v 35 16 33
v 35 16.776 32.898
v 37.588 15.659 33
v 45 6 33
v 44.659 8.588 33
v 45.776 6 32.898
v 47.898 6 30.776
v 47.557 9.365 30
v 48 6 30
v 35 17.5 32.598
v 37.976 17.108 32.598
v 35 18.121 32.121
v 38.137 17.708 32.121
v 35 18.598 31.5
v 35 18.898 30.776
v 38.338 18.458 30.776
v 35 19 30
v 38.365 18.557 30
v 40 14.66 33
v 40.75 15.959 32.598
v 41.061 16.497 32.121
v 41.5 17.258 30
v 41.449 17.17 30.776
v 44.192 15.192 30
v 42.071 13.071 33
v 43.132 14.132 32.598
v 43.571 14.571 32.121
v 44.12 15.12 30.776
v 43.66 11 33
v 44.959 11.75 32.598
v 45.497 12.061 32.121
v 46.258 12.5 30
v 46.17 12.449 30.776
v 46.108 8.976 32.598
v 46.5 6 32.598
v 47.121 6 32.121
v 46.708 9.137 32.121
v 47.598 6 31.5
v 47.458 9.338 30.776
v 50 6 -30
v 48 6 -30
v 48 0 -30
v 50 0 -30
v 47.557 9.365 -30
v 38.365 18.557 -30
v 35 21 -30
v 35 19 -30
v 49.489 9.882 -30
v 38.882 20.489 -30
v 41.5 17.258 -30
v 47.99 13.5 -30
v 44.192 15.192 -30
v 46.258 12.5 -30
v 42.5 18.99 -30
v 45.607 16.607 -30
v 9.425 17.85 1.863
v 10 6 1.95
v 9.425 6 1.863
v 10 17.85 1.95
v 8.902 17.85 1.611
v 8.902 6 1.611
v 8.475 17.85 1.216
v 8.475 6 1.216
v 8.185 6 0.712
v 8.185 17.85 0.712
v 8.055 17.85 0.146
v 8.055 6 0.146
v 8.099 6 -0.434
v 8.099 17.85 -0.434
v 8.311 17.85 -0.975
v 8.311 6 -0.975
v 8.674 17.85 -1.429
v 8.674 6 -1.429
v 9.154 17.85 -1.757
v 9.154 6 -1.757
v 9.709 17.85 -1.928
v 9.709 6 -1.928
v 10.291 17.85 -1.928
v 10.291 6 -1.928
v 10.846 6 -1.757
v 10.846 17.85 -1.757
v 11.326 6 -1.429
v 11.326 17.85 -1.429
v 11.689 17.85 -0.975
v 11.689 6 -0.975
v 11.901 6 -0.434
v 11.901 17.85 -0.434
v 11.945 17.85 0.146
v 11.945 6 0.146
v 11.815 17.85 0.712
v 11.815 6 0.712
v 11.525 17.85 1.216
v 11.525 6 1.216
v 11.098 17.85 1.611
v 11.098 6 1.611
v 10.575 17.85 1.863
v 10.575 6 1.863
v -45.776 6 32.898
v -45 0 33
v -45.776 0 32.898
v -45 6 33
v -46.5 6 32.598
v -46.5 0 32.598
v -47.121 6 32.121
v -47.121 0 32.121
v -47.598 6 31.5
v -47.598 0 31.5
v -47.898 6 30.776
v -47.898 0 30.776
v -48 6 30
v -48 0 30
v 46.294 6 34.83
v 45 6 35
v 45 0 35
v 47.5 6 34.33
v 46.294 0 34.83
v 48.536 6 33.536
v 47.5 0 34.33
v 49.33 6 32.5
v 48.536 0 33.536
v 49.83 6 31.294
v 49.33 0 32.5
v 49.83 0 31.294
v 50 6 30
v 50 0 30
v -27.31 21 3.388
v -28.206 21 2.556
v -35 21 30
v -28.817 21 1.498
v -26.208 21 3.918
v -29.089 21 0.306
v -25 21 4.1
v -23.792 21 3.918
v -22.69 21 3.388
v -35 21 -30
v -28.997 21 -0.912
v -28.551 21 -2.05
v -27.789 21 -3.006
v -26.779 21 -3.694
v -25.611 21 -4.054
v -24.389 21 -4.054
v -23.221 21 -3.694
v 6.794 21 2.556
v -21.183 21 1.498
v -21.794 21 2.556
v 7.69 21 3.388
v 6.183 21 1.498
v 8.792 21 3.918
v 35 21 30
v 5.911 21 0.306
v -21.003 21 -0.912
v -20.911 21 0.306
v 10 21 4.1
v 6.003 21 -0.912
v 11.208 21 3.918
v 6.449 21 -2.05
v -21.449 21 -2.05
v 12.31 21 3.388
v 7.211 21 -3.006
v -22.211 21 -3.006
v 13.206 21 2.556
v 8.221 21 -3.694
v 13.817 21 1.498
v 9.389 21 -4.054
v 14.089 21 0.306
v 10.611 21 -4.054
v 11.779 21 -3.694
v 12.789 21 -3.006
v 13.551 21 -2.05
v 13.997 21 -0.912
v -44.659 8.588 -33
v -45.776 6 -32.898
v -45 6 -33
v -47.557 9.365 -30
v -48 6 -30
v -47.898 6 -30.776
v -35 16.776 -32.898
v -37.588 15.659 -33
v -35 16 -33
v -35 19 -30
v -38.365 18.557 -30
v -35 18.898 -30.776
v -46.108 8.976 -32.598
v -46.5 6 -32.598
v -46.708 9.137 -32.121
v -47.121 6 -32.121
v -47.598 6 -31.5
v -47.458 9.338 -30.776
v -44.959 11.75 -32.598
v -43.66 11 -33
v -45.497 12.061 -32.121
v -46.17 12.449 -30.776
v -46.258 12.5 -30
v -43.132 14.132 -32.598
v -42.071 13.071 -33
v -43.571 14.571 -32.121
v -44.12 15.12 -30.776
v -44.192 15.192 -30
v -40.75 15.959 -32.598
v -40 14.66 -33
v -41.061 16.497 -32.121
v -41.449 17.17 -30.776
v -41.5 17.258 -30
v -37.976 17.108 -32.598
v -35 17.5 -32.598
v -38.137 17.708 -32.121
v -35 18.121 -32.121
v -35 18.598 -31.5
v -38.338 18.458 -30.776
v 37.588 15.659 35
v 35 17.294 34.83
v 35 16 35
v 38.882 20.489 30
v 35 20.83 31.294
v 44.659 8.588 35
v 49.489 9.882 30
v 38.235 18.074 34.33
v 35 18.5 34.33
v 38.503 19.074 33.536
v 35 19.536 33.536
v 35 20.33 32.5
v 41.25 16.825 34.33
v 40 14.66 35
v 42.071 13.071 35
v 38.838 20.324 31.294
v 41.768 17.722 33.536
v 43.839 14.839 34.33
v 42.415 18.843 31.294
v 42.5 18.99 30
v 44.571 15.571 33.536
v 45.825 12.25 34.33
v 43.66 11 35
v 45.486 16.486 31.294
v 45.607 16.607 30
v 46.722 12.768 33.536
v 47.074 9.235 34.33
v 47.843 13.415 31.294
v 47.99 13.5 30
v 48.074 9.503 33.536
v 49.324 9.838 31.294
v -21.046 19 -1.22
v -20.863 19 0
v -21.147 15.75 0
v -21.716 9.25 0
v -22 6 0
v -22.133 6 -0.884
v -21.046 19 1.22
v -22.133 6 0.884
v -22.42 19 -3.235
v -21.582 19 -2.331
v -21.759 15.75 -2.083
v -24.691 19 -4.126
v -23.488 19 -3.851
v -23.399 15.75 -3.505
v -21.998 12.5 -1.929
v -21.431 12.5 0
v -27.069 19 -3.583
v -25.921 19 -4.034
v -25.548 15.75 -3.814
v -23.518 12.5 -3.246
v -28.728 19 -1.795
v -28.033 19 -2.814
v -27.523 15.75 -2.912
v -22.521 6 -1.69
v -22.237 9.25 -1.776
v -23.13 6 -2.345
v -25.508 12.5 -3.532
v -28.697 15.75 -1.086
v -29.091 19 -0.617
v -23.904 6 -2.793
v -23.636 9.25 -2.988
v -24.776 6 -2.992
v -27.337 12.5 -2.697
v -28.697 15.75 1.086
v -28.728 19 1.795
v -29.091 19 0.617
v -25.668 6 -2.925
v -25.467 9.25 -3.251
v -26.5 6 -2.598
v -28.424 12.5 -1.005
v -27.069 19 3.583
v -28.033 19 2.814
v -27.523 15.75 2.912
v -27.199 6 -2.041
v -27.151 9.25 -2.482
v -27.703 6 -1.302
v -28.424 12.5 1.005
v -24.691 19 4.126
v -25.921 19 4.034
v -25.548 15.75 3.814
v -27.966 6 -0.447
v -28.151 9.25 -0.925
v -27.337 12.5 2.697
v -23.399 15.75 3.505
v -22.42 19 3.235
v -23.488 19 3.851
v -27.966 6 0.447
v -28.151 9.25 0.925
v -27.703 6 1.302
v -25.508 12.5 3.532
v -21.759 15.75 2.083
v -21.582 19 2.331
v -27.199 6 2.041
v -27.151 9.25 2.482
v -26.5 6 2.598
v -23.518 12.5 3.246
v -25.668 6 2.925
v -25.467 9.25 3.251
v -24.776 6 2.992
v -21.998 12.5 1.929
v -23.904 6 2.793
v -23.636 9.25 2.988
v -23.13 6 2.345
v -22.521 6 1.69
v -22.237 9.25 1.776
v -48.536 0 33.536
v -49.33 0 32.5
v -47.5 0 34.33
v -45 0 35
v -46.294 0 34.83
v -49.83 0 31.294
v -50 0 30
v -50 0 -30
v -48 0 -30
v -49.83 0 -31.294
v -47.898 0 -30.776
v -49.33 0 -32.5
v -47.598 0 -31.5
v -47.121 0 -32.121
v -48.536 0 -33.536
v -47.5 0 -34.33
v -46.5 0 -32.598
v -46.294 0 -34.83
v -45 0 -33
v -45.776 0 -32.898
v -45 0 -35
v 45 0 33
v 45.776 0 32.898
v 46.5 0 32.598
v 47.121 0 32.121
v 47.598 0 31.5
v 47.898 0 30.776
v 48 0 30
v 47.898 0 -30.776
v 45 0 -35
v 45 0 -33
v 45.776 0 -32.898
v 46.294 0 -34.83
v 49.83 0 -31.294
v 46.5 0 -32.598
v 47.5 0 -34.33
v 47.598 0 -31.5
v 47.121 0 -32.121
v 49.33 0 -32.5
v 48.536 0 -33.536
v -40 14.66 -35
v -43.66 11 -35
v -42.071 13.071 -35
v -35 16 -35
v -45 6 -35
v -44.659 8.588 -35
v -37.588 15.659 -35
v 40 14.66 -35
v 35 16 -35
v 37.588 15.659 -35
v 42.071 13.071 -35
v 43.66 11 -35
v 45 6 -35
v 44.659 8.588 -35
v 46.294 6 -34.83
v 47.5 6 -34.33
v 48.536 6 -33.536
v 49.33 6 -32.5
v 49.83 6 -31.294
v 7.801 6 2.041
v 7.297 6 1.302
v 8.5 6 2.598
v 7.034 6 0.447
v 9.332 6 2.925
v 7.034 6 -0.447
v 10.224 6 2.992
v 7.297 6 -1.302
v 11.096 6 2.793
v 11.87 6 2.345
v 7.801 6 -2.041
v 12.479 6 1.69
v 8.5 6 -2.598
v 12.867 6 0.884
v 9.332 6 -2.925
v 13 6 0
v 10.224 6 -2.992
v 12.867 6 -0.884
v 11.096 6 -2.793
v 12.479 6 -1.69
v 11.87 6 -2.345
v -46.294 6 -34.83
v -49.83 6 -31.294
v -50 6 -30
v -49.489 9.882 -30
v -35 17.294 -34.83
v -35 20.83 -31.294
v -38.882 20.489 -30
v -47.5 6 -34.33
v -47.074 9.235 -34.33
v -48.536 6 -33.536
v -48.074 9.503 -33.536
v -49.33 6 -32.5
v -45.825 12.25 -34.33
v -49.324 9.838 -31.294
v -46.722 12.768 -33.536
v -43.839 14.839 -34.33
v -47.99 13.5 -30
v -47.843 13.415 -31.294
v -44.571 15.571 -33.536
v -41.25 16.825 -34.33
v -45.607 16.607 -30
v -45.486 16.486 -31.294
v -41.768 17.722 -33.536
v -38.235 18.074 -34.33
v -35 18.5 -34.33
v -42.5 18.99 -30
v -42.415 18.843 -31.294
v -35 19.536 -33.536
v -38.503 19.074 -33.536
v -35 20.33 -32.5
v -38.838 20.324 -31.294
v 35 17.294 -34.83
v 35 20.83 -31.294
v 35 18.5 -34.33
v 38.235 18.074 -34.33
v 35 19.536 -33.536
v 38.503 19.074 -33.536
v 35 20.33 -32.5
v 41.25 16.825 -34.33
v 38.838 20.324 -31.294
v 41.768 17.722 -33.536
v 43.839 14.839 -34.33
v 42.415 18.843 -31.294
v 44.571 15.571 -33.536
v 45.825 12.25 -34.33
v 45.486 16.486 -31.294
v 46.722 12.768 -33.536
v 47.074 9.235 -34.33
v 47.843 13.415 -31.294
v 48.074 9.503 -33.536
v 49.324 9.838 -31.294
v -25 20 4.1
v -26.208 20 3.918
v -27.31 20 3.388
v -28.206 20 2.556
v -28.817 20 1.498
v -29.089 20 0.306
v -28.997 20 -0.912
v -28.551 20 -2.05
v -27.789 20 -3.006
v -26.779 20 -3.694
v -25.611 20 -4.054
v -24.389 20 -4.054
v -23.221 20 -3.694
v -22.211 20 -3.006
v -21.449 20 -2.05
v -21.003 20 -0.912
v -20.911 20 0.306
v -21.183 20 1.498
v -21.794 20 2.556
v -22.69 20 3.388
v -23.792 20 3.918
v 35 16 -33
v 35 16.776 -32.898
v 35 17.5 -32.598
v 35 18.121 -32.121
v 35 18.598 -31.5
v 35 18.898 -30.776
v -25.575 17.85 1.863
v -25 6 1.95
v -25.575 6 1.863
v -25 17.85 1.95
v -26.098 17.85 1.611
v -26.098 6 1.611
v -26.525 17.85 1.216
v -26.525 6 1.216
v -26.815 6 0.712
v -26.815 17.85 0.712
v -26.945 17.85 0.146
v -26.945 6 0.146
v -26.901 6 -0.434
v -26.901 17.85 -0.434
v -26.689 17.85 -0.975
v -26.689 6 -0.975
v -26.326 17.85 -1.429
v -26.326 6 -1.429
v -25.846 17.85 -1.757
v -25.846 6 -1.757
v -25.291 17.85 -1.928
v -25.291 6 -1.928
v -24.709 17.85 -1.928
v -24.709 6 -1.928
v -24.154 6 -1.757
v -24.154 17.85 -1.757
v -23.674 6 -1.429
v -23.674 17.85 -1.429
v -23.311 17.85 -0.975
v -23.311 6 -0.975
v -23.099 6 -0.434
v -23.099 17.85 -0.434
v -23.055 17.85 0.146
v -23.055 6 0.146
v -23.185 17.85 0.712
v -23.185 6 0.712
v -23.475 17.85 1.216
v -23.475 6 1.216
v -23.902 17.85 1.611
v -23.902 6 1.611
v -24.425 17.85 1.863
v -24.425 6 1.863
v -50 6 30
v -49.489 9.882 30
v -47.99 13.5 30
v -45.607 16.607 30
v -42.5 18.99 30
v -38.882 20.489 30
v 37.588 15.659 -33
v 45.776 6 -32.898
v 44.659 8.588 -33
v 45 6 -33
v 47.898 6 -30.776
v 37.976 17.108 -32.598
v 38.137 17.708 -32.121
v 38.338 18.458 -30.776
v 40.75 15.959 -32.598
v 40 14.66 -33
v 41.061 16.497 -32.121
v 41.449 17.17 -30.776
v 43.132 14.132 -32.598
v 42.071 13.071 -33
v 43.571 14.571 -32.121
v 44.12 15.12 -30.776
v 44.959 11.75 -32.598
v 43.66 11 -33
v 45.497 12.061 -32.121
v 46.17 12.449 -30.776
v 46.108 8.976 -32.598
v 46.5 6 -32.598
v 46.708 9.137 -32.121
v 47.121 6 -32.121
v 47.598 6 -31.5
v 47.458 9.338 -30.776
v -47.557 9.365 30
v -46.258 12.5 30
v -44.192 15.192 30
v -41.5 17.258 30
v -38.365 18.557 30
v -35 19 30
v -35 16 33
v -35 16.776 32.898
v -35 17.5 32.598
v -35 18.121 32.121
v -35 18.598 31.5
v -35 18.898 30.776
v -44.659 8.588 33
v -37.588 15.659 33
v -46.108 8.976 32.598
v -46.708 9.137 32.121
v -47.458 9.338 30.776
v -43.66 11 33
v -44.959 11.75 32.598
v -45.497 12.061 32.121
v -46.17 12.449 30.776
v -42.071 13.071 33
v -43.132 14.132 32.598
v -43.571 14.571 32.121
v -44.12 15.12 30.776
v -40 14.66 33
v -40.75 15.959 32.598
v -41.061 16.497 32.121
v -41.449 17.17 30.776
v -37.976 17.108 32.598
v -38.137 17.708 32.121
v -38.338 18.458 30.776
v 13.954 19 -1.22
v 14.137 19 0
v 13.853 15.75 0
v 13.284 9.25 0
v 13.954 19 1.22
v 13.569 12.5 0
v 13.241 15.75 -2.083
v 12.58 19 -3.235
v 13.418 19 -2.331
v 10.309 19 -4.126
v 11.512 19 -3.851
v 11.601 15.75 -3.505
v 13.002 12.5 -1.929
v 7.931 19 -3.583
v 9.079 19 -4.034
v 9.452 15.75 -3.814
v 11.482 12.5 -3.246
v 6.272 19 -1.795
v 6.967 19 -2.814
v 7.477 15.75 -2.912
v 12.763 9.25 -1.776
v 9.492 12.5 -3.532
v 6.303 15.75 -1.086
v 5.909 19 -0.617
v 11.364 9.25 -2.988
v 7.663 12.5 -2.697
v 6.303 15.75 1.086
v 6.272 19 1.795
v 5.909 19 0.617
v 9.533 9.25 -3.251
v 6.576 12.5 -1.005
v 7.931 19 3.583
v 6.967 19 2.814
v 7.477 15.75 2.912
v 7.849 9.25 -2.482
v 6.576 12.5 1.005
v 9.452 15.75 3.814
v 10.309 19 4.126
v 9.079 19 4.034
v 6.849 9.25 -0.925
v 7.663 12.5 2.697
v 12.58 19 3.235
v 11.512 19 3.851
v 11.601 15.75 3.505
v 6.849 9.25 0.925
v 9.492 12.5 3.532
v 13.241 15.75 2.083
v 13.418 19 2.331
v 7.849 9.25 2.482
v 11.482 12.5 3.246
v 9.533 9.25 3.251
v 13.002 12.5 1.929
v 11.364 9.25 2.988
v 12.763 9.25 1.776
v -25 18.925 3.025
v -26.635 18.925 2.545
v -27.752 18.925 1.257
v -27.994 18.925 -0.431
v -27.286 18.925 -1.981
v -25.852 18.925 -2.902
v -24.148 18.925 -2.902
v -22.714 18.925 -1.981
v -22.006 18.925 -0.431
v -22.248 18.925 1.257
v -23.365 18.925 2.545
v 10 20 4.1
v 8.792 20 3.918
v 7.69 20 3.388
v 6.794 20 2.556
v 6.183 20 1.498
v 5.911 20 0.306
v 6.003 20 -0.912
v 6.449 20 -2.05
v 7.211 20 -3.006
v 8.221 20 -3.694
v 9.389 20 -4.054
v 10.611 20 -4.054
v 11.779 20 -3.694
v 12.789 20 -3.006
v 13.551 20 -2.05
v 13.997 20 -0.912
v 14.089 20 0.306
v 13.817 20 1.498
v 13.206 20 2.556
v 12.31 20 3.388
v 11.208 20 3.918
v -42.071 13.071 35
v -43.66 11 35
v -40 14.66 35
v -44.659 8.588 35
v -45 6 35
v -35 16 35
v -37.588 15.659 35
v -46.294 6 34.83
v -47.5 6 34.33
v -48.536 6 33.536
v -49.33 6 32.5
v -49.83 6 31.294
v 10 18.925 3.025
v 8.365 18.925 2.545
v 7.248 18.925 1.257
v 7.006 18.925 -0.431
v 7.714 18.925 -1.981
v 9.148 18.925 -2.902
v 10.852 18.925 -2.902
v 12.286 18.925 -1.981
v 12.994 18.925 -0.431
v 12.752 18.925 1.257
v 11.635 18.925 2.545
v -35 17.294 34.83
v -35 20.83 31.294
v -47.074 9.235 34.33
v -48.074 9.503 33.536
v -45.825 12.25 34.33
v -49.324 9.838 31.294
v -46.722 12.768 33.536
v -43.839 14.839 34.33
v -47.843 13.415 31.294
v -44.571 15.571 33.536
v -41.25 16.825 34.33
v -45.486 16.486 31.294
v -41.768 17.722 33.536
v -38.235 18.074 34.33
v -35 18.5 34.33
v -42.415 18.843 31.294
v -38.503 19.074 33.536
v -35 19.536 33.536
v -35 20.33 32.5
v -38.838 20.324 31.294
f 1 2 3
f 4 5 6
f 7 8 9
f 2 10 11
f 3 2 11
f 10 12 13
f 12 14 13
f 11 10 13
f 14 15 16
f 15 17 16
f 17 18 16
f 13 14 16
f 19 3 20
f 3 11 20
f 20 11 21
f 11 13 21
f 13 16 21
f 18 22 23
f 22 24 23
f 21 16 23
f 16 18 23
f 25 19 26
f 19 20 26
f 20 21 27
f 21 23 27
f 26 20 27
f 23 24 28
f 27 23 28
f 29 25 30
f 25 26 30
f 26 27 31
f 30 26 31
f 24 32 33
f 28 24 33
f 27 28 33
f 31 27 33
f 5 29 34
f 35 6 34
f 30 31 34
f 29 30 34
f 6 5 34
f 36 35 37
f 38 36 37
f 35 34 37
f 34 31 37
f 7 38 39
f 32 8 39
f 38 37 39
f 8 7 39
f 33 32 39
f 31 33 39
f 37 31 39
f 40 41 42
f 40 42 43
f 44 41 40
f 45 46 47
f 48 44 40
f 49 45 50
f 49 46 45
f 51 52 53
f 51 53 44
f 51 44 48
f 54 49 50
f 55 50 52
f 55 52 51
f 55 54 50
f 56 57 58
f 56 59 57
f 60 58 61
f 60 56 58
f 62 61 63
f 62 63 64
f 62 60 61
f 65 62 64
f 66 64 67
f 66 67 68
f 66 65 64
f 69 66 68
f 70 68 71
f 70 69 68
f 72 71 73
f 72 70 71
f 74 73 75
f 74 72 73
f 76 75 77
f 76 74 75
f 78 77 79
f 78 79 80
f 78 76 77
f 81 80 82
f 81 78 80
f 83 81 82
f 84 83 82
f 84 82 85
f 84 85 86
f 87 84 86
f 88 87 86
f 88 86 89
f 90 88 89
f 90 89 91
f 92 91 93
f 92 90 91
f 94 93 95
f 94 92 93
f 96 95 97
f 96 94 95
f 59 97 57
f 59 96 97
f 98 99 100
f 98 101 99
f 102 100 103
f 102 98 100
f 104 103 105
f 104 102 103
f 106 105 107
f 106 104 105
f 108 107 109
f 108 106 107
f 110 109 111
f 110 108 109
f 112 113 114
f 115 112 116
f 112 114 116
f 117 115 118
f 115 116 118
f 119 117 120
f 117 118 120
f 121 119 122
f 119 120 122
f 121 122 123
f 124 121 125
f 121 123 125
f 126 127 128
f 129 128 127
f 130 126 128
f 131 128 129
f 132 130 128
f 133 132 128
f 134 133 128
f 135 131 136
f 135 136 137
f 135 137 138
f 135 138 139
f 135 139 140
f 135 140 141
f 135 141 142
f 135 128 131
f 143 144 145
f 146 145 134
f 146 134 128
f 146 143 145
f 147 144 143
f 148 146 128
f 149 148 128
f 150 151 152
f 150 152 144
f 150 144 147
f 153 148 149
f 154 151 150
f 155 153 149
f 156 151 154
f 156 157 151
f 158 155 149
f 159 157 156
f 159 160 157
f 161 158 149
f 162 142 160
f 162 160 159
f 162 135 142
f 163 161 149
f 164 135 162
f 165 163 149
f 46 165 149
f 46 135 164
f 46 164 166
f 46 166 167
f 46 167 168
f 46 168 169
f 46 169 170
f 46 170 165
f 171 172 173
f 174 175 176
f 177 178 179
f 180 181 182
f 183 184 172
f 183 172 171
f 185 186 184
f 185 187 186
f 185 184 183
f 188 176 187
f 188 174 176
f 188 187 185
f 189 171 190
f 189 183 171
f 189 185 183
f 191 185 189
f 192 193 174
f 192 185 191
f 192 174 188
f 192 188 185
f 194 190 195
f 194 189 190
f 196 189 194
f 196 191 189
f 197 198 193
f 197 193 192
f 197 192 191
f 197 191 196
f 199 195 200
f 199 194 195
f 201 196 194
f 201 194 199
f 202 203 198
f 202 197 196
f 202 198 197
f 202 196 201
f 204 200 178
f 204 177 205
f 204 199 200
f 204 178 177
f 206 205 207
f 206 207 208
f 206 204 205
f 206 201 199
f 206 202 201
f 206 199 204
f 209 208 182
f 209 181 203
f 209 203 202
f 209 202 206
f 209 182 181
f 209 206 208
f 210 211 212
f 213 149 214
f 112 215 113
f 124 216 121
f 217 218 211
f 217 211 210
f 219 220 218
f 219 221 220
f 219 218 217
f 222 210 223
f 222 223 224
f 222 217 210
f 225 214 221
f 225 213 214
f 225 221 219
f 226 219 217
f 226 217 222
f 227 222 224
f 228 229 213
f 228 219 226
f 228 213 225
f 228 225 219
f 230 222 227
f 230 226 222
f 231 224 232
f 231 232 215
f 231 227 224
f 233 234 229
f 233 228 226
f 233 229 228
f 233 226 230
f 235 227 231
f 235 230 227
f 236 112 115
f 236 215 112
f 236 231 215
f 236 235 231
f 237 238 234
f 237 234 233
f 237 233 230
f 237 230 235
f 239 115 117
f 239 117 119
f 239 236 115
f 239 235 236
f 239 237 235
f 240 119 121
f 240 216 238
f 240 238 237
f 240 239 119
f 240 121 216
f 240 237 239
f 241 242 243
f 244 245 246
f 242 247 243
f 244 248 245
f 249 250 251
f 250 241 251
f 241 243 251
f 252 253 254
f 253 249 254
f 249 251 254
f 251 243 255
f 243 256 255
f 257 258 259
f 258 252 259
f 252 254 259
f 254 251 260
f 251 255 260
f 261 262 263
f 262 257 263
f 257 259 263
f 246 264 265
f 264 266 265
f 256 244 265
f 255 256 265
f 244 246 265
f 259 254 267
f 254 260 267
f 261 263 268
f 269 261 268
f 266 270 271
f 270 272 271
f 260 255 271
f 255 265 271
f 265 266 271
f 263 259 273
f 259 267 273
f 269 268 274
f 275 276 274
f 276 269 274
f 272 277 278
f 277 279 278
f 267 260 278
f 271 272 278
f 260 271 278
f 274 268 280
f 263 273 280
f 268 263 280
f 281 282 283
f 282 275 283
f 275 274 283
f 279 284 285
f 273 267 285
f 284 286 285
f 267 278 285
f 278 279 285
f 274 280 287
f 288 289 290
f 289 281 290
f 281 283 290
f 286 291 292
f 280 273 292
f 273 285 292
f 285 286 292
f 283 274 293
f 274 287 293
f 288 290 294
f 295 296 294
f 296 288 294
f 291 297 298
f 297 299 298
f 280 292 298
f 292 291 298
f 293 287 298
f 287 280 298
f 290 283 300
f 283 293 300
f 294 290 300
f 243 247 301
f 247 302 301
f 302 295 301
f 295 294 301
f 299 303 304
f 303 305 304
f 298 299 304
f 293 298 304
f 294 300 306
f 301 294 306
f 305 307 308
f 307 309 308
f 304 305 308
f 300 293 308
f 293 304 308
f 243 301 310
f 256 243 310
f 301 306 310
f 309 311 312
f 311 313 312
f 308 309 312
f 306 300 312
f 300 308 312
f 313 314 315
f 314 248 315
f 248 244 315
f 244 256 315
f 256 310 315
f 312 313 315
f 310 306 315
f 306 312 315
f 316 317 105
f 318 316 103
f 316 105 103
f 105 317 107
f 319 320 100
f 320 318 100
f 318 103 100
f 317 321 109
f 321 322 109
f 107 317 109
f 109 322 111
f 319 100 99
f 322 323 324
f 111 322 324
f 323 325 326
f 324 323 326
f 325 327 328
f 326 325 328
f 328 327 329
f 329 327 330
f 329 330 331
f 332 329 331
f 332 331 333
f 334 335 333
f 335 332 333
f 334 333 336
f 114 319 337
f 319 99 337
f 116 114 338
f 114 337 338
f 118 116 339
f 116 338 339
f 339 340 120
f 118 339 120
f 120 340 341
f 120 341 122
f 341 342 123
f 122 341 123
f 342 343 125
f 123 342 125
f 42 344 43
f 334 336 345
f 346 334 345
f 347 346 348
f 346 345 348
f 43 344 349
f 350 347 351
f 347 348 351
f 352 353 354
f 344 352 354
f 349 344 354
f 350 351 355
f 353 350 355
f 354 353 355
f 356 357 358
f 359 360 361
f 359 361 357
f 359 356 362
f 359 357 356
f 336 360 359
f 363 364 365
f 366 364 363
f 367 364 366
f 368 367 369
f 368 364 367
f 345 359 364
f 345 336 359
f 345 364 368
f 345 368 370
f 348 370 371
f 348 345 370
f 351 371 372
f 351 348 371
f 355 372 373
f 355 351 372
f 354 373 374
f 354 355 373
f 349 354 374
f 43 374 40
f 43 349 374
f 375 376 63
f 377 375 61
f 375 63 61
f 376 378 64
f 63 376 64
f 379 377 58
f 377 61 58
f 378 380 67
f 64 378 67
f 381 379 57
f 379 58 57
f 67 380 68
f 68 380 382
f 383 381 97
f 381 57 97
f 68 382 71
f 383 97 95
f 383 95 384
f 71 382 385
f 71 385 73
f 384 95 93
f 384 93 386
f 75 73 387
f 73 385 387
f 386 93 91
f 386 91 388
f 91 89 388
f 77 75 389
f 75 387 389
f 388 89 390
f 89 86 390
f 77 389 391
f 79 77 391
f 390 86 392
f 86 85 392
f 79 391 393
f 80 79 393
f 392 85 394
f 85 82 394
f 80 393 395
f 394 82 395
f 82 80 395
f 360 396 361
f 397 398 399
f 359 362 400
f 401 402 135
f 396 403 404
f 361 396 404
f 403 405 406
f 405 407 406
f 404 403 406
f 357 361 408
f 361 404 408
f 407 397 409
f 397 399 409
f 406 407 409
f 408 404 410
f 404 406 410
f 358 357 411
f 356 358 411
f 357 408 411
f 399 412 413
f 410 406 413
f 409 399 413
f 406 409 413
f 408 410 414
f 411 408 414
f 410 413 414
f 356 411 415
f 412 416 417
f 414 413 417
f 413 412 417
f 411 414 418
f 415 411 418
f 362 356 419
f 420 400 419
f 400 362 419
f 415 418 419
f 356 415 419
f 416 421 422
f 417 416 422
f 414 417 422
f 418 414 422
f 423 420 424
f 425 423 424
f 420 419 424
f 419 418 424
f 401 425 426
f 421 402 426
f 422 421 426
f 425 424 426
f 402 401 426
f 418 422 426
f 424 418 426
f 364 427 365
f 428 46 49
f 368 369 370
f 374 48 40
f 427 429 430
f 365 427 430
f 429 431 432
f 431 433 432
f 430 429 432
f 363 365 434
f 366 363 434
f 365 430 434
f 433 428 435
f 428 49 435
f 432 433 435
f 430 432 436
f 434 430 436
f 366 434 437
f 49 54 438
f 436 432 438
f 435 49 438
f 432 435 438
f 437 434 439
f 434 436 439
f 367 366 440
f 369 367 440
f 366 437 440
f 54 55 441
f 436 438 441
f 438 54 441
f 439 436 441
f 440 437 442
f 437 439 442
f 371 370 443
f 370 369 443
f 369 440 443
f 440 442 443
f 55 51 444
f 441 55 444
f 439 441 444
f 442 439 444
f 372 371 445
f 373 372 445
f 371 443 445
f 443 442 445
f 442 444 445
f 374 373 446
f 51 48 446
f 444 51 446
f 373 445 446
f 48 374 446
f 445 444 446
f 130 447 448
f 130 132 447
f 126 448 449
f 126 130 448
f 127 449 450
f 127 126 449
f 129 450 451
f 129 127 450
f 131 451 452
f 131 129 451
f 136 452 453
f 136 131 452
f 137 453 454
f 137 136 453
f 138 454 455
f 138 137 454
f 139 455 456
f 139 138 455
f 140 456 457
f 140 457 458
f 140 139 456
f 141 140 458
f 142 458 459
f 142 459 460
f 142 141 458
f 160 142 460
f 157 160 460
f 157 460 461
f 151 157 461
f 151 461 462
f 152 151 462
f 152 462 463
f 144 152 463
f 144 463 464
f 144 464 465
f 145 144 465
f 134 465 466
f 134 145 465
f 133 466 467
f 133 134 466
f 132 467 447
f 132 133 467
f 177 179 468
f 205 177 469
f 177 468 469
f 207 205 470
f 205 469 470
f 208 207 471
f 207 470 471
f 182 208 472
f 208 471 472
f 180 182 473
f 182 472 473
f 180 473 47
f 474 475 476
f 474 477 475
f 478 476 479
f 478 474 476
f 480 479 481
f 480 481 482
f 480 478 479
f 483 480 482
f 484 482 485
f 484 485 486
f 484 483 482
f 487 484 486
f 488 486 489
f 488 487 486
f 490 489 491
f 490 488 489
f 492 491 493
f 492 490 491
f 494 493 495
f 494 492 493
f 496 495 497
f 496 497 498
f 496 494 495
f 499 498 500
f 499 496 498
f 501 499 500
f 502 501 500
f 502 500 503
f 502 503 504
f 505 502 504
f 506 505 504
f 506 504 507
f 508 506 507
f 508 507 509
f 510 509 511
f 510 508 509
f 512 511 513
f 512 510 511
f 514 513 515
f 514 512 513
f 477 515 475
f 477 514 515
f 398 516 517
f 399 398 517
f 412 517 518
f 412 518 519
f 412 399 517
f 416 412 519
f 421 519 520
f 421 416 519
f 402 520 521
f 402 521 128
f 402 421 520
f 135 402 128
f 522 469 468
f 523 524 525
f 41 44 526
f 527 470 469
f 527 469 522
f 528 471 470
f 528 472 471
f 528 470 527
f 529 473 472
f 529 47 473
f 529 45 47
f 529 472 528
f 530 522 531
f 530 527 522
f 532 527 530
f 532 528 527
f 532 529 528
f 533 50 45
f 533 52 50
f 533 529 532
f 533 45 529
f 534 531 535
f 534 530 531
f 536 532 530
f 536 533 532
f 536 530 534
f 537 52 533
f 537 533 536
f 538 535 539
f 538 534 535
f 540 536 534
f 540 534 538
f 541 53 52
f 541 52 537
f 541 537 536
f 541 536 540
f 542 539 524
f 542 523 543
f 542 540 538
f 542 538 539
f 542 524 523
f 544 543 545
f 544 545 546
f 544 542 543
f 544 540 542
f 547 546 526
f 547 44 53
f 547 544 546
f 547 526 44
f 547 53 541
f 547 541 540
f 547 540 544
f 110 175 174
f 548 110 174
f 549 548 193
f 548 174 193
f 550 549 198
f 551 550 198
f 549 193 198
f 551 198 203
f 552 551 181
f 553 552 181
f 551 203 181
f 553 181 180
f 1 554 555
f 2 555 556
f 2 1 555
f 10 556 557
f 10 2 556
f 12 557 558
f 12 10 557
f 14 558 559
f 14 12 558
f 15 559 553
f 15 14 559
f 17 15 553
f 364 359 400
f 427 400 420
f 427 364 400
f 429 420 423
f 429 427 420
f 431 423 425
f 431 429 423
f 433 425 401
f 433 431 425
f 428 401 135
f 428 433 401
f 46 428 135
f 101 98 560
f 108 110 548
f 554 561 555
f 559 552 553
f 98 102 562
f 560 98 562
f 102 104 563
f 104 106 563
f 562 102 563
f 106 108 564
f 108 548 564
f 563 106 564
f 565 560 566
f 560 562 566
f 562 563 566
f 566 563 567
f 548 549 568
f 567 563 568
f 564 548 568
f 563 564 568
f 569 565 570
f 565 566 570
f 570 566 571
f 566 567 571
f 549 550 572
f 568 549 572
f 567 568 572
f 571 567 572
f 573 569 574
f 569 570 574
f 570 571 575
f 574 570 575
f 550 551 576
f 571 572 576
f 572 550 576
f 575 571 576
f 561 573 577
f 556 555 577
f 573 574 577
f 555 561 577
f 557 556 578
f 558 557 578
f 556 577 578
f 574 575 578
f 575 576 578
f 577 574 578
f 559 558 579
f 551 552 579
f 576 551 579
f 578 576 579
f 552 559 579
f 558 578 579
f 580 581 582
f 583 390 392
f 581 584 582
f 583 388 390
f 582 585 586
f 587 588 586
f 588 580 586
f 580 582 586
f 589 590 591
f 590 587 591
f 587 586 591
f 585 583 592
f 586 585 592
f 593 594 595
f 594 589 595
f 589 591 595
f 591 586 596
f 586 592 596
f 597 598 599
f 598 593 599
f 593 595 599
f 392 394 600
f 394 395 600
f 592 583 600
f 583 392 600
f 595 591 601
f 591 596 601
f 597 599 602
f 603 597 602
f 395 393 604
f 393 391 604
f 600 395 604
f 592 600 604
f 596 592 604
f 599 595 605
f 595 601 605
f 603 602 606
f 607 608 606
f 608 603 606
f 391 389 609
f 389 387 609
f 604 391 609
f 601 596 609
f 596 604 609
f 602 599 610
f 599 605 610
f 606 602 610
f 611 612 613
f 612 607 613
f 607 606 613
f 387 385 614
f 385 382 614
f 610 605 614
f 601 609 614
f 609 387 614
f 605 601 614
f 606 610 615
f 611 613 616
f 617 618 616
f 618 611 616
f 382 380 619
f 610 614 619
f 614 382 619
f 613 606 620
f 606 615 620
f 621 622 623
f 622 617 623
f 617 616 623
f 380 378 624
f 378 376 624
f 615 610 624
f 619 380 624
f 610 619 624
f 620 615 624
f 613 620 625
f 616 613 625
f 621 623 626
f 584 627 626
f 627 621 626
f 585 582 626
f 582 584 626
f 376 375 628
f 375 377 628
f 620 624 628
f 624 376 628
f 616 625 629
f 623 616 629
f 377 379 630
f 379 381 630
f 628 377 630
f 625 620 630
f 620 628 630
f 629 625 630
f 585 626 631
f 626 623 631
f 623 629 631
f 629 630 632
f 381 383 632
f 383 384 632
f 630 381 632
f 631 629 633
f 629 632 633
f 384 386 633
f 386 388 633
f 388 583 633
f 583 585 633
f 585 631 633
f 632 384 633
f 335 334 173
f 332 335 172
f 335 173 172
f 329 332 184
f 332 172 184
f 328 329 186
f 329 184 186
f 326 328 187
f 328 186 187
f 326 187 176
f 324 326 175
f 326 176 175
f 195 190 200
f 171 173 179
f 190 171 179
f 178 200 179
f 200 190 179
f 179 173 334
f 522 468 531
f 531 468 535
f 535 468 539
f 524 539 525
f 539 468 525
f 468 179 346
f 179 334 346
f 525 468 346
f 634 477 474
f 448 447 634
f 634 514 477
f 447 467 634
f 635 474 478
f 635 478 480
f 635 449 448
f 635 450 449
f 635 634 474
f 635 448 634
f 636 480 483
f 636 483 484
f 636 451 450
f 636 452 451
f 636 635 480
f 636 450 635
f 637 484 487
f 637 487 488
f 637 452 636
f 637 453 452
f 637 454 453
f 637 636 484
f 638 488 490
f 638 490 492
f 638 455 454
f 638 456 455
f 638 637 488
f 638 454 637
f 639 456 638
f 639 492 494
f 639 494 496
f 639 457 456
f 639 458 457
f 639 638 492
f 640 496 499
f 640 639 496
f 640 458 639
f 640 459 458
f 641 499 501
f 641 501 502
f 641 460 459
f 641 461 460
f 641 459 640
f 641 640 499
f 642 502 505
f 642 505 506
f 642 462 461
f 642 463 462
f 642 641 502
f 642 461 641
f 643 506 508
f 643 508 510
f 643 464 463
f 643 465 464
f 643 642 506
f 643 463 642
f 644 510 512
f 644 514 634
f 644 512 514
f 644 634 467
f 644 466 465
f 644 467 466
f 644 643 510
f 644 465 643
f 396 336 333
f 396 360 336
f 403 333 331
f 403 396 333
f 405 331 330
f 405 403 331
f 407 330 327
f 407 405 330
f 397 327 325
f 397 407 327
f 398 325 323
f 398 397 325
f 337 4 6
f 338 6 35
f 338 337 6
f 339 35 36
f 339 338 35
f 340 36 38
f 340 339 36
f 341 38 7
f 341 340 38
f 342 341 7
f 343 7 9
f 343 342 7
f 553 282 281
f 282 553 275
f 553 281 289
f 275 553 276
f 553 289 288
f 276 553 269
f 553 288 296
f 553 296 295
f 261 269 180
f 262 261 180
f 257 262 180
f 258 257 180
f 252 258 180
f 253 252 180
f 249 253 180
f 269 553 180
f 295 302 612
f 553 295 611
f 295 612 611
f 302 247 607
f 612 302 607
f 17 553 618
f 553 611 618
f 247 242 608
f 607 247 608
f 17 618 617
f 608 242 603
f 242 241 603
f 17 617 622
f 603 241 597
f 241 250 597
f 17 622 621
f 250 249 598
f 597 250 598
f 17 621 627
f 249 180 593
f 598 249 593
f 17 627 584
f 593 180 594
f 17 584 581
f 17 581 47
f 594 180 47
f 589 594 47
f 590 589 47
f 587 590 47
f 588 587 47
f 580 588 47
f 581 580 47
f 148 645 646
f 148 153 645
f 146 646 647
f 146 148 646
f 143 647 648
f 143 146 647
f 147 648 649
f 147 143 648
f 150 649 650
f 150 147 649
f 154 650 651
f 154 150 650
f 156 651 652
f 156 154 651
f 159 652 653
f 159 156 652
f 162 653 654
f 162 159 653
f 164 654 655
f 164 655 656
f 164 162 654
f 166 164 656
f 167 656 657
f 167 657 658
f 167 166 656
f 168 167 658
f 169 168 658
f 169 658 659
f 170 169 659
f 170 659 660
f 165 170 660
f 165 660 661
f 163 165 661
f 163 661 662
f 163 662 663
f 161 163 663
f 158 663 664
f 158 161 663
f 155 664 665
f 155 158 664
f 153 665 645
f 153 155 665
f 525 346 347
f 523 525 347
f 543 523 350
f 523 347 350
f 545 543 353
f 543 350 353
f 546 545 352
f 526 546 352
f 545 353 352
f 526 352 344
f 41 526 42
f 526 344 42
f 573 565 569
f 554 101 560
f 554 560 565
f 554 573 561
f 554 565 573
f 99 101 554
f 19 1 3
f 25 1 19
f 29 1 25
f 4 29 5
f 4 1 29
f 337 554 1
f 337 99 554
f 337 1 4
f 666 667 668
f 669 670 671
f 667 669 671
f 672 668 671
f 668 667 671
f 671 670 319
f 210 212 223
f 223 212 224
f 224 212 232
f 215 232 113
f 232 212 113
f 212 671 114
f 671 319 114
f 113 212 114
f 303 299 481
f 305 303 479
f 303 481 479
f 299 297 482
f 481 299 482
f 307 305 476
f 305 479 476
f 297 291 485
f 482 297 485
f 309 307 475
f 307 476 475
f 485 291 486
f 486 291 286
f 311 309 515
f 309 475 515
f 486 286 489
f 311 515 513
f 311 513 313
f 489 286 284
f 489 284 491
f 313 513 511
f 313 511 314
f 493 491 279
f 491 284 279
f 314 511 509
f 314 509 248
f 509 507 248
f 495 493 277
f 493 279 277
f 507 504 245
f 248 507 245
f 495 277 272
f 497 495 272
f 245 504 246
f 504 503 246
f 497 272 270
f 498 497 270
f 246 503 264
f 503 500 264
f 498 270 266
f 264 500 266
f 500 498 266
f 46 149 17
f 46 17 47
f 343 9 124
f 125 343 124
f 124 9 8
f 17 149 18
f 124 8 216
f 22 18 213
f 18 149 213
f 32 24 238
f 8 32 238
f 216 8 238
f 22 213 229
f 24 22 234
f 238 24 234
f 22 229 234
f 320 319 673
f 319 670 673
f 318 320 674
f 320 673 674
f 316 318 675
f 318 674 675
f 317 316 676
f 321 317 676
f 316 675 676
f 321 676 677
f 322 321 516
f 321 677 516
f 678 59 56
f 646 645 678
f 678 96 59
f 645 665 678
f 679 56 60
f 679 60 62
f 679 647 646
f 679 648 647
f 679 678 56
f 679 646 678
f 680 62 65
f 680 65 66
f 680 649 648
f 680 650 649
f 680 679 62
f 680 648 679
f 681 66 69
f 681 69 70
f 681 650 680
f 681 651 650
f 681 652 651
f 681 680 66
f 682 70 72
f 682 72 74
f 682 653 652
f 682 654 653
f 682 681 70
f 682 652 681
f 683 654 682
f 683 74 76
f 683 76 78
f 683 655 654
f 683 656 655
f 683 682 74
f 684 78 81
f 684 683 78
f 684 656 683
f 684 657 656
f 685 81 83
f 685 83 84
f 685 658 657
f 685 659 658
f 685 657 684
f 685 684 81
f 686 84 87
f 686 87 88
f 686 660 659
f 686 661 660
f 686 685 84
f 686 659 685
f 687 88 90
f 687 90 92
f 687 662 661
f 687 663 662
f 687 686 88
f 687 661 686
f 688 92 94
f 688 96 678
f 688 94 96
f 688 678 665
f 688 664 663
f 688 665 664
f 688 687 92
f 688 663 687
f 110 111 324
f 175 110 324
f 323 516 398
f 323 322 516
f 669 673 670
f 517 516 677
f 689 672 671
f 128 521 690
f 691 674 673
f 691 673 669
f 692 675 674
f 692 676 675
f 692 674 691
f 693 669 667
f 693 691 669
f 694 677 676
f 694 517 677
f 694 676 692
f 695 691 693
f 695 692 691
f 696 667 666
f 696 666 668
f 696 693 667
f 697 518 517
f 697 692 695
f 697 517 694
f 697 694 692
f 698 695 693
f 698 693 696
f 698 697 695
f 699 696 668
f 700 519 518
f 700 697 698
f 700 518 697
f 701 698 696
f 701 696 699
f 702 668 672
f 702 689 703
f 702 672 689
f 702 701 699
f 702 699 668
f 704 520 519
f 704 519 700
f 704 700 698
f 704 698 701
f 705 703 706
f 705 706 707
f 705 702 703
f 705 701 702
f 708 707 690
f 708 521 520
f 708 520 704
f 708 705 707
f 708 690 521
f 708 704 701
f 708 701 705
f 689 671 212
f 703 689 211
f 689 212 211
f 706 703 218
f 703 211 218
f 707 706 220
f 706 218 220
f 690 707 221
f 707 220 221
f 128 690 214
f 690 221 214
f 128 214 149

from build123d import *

# Parameters (mm, degrees)
SKETCH1_W                                     = 100
SKETCH1_H                                     = 70
BOSS_EXTRUDE1_DEPTH                           = 21
FILLET1_R                                     = 15
FILLET2_R                                     = 5
SHELL1_T                                      = -2
SKETCH2_W                                     = 34.075485645
SKETCH2_H                                     = 60
CUT_EXTRUDE1_DEPTH                            = 45
BOSS_EXTRUDE2_REACH                           = 64.849
SKETCH4_R                                     = 3
BOSS_EXTRUDE2_DRAFT                           = -5
CSK_FOR_M10_FLAT_HEAD_MACHINE_SCREW4_AT_COUNT = 2
CSK_FOR_M10_FLAT_HEAD_MACHINE_SCREW4_AT_PITCH = 35


with BuildPart() as part:
    # Sketch1 → Boss-Extrude1 (new body)
    with BuildSketch(Plane(origin=(0, 0, 0), x_dir=(1, 0, 0), z_dir=(0, 1, 0))):
        Rectangle(SKETCH1_W, SKETCH1_H)
    extrude(amount=BOSS_EXTRUDE1_DEPTH)

    # Fillet1
    fillet1_edges = [part.edges().sort_by_distance(p)[0] for p in [
        (-50, 21, 0),
        (50, 21, 0),
    ]]
    fillet(fillet1_edges, radius=FILLET1_R)

    # Fillet2
    fillet2_edges = [part.edges().sort_by_distance(p)[0] for p in [
        (0, 21, -35),
        (0, 21, 35),
        (-50, 3, -35),
        (50, 3, -35),
        (-45.606601718, 16.606601718, -35),
        (45.606601718, 16.606601718, -35),
        (50, 3, 35),
        (-50, 3, 35),
        (-45.606601718, 16.606601718, 35),
        (45.606601718, 16.606601718, 35),
    ]]
    fillet(fillet2_edges, radius=FILLET2_R)

    # Shell1
    shell1_openings = [part.faces().sort_by_distance(p)[0] for p in [
        (0, 0, 0),
    ]]
    offset(amount=SHELL1_T, openings=shell1_openings, kind=Kind.INTERSECTION)

    # Sketch2 → Cut-Extrude1 (cut)
    with BuildSketch(Plane(origin=(0, 21, 0), x_dir=(1, 0, 0), z_dir=(0, 1, 0))):
        with Locations((52.037742823, 0)):
            Rectangle(SKETCH2_W, SKETCH2_H)
    extrude(amount=-CUT_EXTRUDE1_DEPTH, mode=Mode.SUBTRACT)




with BuildPart() as boss_extrude2_long_prism_1:
    # Sketch4 → Boss-Extrude2 (the long prism of profile 1, to be tilted and cut off)
    with BuildSketch(Plane(origin=(0, 6, 0), x_dir=(1, 0, 0), z_dir=(0, 1, 0))):
        with Locations((-25, 0)):
            Circle(SKETCH4_R)
    extrude(amount=BOSS_EXTRUDE2_REACH)
    boss_extrude2_tool1_sides = [boss_extrude2_long_prism_1.faces().sort_by_distance(p)[0] for p in [
        (-28, 38.4245, 0),
    ]]
    draft(boss_extrude2_tool1_sides, Plane(origin=(0, 6, 0), x_dir=(1, 0, 0), z_dir=(0, 1, 0)), BOSS_EXTRUDE2_DRAFT)  # the draft: side faces tilted about the start plane


with BuildPart() as part_1:
    add(part.part)
    boss_extrude2_tool1 = boss_extrude2_long_prism_1.part - part.part



with BuildPart() as boss_extrude2_long_prism_2:
    # Sketch4 → Boss-Extrude2 (the long prism of profile 2, to be tilted and cut off)
    with BuildSketch(Plane(origin=(0, 6, 0), x_dir=(1, 0, 0), z_dir=(0, 1, 0))):
        with Locations((10, 0)):
            Circle(SKETCH4_R)
    extrude(amount=BOSS_EXTRUDE2_REACH)
    boss_extrude2_tool2_sides = [boss_extrude2_long_prism_2.faces().sort_by_distance(p)[0] for p in [
        (7, 38.4245, 0),
    ]]
    draft(boss_extrude2_tool2_sides, Plane(origin=(0, 6, 0), x_dir=(1, 0, 0), z_dir=(0, 1, 0)), BOSS_EXTRUDE2_DRAFT)  # the draft: side faces tilted about the start plane


with BuildPart() as part_2:
    add(part_1.part)
    boss_extrude2_tool2 = boss_extrude2_long_prism_2.part - part.part
    add(boss_extrude2_tool1.solids().sort_by_distance((-25, 6, 0))[0])
    add(boss_extrude2_tool2.solids().sort_by_distance((10, 6, 0))[0])

    # Sketch13 → CSK for M10 Flat Head Machine Screw4 (revolve, cut)
    with BuildSketch(Plane(origin=(-25, 21, 0), x_dir=(0, 0, 1), z_dir=(1, 0, 0))):
        Polygon((0, 0), (0, 15), (1.95, 15), (1.95, 3.15), (4.1, 1), (4.1, 0), align=None)
    csk_for_m10_flat_head_machine_screw4 = revolve(axis=Axis((-25, 27.35, 0), (0, -1, 0)), mode=Mode.SUBTRACT)

    # CSK for M10 Flat Head Machine Screw4 at: CSK for M10 Flat Head Machine Screw4 ×2
    with Locations(*[(i * CSK_FOR_M10_FLAT_HEAD_MACHINE_SCREW4_AT_PITCH, 0, 0) for i in range(1, CSK_FOR_M10_FLAT_HEAD_MACHINE_SCREW4_AT_COUNT)]):
        add(csk_for_m10_flat_head_machine_screw4, mode=Mode.SUBTRACT)


solid = part_2.part
